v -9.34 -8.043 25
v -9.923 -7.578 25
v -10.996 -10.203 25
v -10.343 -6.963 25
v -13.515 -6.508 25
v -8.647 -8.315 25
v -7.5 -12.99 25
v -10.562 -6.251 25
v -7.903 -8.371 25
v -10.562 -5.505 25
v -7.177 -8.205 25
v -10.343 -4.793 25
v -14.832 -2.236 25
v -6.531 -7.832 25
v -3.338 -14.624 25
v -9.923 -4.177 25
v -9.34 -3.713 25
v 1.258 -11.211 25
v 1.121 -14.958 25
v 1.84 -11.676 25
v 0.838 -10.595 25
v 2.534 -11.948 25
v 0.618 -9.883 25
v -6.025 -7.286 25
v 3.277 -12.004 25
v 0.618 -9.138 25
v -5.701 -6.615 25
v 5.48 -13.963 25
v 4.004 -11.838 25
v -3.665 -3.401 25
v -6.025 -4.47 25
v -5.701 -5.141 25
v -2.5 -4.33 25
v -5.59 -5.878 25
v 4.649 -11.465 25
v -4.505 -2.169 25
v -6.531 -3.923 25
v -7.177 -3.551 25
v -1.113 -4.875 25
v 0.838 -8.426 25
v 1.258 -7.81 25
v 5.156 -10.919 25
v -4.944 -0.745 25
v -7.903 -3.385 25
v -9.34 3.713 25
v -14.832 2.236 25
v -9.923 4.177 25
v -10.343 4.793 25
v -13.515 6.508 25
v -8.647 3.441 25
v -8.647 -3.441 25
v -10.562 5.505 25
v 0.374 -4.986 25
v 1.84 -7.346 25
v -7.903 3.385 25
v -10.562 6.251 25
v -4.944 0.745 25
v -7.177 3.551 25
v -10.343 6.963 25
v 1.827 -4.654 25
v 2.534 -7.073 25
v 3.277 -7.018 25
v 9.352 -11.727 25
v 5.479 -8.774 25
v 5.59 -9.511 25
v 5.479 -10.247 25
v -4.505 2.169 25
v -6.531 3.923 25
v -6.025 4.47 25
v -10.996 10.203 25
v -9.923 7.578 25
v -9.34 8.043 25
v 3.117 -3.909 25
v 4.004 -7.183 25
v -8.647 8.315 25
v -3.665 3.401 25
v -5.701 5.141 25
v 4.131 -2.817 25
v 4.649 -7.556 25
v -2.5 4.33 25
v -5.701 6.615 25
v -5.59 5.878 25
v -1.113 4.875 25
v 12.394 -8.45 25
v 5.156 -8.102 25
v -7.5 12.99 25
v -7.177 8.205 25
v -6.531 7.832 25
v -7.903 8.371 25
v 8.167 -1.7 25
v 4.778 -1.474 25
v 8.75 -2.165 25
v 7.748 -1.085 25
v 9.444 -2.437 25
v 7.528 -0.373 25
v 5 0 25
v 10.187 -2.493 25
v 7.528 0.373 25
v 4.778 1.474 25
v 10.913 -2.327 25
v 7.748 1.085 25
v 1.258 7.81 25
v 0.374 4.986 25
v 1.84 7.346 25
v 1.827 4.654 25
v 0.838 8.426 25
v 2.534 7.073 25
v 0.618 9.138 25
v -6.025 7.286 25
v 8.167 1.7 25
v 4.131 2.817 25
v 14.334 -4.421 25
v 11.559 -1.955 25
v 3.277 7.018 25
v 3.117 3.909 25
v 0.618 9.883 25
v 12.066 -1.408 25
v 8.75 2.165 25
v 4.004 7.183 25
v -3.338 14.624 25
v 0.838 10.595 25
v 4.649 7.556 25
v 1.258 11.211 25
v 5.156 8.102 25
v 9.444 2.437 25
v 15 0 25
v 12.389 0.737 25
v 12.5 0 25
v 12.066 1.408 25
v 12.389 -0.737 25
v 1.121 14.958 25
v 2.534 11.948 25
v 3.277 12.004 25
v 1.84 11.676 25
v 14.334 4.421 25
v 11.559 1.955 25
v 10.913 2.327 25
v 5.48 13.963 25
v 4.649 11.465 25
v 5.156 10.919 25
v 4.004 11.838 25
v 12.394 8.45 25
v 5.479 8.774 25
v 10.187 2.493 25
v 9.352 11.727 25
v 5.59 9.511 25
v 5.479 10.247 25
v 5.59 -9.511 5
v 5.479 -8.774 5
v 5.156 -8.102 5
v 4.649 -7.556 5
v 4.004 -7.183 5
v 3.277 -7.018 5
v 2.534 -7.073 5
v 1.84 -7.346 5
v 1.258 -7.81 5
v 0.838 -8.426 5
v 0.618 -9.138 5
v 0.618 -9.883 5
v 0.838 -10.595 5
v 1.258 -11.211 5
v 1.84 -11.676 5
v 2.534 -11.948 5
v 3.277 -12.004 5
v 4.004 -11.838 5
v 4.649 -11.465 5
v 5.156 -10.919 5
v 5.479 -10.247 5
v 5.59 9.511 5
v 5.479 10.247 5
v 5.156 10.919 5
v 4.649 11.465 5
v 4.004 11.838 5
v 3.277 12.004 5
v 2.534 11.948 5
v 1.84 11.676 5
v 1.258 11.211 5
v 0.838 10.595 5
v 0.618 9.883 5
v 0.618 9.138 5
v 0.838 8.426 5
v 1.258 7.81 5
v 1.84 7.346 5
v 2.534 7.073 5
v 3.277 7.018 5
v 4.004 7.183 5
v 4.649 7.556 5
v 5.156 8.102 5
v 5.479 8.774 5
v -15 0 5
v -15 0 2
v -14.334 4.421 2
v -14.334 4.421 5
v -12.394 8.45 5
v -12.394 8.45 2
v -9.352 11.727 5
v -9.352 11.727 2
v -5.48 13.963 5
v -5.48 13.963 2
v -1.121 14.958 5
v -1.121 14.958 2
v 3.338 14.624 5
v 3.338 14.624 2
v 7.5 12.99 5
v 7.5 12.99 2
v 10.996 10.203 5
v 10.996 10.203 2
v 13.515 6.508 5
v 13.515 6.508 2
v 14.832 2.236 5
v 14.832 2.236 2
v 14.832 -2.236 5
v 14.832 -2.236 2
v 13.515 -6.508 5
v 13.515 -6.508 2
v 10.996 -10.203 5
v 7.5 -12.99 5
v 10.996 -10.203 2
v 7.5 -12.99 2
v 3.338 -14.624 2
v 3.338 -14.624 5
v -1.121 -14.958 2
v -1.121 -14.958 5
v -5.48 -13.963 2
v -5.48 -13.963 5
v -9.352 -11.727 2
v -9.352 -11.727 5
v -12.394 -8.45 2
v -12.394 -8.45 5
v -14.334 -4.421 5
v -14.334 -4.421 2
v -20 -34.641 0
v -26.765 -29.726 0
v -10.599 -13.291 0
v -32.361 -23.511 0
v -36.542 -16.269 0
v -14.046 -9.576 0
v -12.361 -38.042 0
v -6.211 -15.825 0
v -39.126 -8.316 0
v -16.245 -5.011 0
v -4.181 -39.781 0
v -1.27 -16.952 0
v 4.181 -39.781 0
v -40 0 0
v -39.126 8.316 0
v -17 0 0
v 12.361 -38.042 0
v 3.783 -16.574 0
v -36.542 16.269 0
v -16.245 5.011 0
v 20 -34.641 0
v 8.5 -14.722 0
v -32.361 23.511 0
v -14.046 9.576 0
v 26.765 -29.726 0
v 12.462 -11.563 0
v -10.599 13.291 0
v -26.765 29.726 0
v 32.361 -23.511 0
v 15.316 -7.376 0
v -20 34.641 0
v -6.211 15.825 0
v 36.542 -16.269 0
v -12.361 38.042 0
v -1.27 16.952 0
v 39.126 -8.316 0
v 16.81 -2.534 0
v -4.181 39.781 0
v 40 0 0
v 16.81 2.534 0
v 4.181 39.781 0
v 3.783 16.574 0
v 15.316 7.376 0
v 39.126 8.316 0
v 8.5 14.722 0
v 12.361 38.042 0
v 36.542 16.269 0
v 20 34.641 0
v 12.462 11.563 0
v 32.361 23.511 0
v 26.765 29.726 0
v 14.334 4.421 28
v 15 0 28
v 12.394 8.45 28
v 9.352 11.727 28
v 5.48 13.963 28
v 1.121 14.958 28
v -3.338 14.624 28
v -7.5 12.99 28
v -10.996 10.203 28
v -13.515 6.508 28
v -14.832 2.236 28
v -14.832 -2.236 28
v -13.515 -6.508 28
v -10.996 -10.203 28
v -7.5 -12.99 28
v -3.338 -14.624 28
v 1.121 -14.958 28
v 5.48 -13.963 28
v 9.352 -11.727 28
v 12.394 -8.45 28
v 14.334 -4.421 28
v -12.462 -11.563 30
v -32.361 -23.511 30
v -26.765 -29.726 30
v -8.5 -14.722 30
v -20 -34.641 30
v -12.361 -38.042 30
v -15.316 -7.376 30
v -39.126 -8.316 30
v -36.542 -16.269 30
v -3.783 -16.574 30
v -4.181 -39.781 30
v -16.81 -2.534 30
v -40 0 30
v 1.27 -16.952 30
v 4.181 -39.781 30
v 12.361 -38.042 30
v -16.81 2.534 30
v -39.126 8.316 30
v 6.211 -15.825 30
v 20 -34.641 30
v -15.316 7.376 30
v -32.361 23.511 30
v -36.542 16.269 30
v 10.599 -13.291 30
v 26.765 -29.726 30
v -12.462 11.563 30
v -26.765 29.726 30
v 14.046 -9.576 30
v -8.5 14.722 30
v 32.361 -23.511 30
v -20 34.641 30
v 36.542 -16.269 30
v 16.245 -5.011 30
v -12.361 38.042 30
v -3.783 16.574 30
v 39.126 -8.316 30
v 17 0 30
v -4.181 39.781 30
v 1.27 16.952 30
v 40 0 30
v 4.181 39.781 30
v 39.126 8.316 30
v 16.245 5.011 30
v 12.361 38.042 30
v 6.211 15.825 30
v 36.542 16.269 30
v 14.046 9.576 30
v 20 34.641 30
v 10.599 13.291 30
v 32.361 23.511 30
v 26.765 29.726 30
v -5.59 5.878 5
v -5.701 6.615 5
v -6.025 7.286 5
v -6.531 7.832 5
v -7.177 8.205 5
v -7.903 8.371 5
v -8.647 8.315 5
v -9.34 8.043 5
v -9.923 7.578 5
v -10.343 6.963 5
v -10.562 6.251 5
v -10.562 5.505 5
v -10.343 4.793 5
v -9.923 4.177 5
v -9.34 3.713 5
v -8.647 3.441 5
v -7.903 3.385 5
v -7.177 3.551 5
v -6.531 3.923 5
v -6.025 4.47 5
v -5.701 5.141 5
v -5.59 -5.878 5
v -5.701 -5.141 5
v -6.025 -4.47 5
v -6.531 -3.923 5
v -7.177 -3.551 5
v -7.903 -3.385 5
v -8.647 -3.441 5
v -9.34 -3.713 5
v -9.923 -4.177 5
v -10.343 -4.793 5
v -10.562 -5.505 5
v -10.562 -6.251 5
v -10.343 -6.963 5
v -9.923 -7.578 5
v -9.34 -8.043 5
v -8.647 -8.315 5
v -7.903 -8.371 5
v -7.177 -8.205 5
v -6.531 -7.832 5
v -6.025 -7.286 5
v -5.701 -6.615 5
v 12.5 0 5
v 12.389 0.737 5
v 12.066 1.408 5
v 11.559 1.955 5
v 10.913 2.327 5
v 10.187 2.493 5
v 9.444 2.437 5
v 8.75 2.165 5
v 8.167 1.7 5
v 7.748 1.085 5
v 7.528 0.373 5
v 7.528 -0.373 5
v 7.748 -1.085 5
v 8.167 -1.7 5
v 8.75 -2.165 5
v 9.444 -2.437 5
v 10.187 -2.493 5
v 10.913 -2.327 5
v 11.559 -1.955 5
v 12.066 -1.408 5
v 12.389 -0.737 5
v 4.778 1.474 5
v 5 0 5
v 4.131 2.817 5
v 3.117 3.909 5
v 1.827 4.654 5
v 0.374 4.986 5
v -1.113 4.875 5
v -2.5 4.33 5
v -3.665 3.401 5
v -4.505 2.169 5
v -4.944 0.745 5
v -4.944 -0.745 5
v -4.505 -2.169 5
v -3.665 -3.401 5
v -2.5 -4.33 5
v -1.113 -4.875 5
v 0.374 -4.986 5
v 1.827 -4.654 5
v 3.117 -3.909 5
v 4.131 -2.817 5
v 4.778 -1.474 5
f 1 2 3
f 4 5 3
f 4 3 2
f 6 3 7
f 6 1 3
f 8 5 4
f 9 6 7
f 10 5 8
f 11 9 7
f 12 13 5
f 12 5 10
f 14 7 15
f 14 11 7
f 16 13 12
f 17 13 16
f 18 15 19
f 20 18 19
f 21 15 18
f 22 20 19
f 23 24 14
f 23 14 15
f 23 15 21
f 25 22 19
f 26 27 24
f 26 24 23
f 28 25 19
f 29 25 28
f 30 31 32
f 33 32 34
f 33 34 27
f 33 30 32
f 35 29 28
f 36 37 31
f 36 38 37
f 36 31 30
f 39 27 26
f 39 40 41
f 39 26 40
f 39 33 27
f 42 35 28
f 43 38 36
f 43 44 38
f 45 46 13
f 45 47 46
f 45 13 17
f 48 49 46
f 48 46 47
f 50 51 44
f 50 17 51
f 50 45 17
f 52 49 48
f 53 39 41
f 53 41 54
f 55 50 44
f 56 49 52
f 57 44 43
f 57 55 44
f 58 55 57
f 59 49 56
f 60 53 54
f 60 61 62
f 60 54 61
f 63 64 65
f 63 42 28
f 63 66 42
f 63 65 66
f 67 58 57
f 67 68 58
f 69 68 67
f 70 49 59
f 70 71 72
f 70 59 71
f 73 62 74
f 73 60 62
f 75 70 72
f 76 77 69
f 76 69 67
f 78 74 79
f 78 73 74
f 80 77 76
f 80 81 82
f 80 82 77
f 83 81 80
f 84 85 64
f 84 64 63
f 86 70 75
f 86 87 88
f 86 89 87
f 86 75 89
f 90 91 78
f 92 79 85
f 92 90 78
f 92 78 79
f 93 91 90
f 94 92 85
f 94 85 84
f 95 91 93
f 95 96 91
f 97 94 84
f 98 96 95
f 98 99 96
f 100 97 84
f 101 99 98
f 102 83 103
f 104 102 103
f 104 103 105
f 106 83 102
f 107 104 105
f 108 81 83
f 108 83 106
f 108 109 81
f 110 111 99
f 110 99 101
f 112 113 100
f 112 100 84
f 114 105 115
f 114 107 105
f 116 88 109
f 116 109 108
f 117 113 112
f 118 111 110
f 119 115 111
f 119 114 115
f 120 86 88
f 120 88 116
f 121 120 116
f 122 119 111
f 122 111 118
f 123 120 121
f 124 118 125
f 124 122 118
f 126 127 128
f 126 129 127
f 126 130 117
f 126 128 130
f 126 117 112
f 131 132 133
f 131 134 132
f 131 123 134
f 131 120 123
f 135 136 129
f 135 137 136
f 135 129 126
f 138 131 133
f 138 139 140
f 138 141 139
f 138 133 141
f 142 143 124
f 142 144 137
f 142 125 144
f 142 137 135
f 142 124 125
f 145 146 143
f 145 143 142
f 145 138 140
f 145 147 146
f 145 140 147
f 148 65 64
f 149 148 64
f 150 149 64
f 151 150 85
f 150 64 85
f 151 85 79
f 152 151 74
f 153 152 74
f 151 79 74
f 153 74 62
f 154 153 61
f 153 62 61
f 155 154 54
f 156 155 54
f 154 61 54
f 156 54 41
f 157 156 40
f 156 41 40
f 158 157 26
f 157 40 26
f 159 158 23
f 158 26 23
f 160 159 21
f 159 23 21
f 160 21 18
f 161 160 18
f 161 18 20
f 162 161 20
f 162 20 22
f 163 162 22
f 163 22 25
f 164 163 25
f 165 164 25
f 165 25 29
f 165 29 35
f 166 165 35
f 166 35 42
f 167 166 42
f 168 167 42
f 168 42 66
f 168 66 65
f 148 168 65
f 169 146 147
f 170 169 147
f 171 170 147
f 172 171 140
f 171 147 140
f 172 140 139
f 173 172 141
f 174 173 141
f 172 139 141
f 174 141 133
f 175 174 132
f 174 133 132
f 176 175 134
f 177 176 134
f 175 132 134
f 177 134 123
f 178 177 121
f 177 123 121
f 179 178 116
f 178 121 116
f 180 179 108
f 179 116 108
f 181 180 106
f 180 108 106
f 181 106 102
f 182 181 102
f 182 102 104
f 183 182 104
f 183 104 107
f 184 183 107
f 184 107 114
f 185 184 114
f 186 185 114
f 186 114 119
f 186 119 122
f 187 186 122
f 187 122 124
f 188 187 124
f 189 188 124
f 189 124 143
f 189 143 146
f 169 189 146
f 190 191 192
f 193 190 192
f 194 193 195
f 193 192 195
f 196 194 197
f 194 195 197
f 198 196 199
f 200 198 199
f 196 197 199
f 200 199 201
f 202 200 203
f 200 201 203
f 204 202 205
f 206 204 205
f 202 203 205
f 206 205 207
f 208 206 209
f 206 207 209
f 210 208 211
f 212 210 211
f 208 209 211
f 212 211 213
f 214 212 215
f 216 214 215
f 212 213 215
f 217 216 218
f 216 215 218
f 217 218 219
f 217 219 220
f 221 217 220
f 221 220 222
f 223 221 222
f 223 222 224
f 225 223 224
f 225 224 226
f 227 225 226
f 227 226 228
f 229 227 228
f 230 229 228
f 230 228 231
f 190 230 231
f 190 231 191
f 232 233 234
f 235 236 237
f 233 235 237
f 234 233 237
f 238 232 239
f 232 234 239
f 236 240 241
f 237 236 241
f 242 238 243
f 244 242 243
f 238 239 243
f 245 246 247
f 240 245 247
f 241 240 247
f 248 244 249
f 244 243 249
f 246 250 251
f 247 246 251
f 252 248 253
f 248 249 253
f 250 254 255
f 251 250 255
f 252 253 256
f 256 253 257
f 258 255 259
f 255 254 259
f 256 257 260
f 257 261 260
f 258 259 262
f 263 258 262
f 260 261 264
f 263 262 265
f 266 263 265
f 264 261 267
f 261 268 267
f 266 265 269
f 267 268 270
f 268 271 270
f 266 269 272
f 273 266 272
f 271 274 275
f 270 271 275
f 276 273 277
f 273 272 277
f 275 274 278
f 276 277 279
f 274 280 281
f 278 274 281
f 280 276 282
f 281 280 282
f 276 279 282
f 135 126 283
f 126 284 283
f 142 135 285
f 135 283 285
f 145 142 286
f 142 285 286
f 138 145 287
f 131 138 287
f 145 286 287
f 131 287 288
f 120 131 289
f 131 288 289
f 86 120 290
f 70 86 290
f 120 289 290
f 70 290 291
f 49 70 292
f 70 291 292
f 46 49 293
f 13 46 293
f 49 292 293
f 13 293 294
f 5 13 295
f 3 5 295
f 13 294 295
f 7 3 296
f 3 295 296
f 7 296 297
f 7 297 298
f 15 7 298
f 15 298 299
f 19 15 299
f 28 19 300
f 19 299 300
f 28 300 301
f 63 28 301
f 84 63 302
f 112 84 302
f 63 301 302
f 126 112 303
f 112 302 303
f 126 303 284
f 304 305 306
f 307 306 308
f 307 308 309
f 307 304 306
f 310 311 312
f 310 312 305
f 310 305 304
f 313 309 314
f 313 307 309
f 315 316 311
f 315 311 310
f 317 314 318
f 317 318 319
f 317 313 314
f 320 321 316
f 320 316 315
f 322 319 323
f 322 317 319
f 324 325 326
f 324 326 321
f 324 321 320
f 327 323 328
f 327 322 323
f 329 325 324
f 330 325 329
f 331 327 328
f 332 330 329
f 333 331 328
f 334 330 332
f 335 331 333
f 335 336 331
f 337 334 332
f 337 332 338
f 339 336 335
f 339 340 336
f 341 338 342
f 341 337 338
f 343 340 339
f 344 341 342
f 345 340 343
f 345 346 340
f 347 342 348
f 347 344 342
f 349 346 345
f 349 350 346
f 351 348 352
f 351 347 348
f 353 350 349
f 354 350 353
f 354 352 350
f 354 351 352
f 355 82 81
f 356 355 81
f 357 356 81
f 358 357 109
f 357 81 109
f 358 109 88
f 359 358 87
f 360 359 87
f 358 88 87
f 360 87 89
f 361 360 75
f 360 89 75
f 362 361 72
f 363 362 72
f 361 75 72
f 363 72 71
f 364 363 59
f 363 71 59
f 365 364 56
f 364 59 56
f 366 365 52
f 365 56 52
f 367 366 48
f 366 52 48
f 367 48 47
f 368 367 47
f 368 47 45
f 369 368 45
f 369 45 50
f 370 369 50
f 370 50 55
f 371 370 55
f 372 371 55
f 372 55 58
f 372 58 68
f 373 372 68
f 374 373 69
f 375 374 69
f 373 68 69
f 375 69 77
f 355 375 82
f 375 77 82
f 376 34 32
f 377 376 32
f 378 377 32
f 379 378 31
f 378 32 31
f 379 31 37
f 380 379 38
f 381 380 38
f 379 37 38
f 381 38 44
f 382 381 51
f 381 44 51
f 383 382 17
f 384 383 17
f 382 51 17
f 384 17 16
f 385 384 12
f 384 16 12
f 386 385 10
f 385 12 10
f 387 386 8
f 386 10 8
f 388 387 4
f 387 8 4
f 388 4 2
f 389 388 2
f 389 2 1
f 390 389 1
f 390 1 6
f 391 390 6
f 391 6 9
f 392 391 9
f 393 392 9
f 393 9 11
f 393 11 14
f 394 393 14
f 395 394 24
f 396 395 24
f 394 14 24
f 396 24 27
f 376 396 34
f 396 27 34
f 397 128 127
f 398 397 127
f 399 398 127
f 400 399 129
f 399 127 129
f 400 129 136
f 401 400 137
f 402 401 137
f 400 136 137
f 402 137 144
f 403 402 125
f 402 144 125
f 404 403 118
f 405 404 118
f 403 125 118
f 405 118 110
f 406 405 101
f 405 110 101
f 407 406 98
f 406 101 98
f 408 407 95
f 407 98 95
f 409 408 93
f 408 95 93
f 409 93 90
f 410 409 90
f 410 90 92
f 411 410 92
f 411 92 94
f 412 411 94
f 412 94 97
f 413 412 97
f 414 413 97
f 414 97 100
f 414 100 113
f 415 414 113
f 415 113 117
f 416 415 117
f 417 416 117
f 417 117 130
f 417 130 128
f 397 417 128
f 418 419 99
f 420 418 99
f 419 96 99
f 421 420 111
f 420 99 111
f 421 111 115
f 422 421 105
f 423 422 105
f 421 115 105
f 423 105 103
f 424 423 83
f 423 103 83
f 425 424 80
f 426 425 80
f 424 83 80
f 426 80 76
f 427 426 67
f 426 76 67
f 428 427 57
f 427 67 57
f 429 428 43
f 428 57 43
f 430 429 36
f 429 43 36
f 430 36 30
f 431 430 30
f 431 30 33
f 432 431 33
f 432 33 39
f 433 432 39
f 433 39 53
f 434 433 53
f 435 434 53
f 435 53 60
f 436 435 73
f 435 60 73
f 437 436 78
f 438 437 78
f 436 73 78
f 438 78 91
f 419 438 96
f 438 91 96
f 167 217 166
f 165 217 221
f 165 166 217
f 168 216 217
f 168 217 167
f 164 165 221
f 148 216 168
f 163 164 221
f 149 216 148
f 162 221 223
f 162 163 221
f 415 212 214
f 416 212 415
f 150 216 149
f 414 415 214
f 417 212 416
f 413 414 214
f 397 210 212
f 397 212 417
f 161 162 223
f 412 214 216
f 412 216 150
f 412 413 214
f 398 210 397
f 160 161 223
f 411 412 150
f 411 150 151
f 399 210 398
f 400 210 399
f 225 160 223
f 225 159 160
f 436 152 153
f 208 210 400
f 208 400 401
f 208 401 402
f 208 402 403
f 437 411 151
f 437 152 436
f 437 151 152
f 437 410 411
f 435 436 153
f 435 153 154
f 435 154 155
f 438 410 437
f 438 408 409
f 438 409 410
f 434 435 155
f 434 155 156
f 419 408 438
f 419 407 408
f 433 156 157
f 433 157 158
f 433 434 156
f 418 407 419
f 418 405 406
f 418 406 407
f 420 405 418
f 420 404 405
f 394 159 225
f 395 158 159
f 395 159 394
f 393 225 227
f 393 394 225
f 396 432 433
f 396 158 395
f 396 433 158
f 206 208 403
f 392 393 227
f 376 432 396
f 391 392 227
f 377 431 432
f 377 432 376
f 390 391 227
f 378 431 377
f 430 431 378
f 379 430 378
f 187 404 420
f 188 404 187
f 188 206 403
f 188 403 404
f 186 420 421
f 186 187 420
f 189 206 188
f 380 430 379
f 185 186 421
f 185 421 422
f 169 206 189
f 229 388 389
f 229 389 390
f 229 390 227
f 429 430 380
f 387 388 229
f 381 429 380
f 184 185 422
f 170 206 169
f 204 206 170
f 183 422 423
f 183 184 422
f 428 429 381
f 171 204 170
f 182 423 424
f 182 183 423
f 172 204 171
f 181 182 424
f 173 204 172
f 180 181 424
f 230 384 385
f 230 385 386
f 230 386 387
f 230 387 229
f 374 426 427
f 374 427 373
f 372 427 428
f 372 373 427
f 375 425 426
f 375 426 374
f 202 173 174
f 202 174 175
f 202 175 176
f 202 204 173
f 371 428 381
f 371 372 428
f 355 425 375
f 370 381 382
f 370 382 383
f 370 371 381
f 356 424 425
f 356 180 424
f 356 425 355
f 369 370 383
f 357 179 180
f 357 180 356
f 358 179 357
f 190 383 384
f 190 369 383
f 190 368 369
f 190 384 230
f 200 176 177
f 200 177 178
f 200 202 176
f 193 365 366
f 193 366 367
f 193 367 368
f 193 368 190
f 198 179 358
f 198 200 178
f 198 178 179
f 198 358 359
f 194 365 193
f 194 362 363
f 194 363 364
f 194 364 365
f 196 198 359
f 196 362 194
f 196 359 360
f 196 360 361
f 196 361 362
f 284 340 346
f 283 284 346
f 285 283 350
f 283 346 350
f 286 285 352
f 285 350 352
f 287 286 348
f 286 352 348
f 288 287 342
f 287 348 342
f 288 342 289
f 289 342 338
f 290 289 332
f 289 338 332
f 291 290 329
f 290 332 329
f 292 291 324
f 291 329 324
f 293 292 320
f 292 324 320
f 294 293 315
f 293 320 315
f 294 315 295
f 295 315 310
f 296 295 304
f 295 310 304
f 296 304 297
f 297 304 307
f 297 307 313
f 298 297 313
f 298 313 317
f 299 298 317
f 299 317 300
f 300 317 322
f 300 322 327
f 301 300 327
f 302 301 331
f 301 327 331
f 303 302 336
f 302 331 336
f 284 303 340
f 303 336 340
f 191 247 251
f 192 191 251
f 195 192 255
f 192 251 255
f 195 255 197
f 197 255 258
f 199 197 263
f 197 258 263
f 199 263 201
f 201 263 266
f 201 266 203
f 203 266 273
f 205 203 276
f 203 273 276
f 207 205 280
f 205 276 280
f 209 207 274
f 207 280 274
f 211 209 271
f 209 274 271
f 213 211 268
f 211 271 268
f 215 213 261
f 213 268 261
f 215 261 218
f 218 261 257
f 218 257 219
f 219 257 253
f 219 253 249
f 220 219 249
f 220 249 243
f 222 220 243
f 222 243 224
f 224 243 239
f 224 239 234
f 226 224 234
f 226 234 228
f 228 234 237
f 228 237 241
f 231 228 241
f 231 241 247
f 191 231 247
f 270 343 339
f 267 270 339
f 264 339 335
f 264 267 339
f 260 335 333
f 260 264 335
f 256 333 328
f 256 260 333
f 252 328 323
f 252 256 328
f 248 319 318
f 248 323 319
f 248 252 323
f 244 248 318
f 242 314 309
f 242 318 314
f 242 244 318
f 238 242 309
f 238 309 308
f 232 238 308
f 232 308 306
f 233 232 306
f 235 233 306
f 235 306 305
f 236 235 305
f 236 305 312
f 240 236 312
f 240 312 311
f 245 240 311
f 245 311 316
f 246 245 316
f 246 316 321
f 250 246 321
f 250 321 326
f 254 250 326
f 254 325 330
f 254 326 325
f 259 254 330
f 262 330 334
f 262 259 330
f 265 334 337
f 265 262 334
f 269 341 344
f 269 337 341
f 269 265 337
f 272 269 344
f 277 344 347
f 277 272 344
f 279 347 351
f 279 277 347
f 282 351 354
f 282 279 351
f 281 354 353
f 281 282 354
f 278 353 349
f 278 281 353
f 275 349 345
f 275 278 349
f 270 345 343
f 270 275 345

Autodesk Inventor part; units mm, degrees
ref_plane "YZ Plane" through (0, 0, 0) normal (1, 0, 0) x (0, 1, 0)
ref_plane "XZ Plane" through (0, 0, 0) normal (0, 1, 0) x (-1, 0, 0)
ref_plane "XY Plane" through (0, 0, 0) normal (0, 0, 1) x (1, 0, 0)
sketch "Sketch28" plane through (0, 0, 0) normal (0, 0, 1) x (1, 0, 0)
  point P0 (0, 0)
sketch "Sketch29" plane through (0, 0, 0) normal (0, 0, 1) x (1, 0, 0)
  circle A0 centre (0, 0) radius 40
  dimension "d84" = 80
extrude "Extrusion25" add sketch "Sketch29" along normal blind 30
sketch "Sketch30" plane through (0, 0, 30) normal (0, 0, 1) x (1, 0, 0)
  circle A0 centre (0, 0) radius 15
  dimension "d87" = 30
extrude "Extrusion26" cut sketch "Sketch30" against normal blind 5
sketch "Sketch31" plane through (0, 0, 0) normal (0, 0, -1) x (-1, 0, 0)
  circle A0 centre (0, 0) radius 15
  dimension "d90" = 30
extrude "Extrusion27" cut sketch "Sketch31" against normal blind 5
sketch "Sketch32" plane through (0, 0, 25) normal (0, 0, 1) x (1, 0, 0)
  circle A0 centre (0, 0) radius 5
  dimension "d93" = 10
extrude "Extrusion28" cut sketch "Sketch32" against normal blind 20
sketch "Sketch33" plane through (0, 0, 25) normal (0, 0, 1) x (1, 0, 0)
  circle A0 centre (10, 0) radius 2.5
  circle A1 centre (3.0902, 9.5106) radius 2.5
  circle A2 centre (-8.0902, 5.8779) radius 2.5
  circle A3 centre (-8.0902, -5.8779) radius 2.5
  circle A4 centre (3.0902, -9.5106) radius 2.5
  point P0 (0, 0)
  dimension "d96" = 5
  dimension "d99" = 360
extrude "Extrusion29" cut sketch "Sketch33" against normal blind 20
chamfer "Chamfer1" distance 2 angle 45 2 edges at (15, 0, 0) (-15, 0, 30)
properties part number "wheel"
